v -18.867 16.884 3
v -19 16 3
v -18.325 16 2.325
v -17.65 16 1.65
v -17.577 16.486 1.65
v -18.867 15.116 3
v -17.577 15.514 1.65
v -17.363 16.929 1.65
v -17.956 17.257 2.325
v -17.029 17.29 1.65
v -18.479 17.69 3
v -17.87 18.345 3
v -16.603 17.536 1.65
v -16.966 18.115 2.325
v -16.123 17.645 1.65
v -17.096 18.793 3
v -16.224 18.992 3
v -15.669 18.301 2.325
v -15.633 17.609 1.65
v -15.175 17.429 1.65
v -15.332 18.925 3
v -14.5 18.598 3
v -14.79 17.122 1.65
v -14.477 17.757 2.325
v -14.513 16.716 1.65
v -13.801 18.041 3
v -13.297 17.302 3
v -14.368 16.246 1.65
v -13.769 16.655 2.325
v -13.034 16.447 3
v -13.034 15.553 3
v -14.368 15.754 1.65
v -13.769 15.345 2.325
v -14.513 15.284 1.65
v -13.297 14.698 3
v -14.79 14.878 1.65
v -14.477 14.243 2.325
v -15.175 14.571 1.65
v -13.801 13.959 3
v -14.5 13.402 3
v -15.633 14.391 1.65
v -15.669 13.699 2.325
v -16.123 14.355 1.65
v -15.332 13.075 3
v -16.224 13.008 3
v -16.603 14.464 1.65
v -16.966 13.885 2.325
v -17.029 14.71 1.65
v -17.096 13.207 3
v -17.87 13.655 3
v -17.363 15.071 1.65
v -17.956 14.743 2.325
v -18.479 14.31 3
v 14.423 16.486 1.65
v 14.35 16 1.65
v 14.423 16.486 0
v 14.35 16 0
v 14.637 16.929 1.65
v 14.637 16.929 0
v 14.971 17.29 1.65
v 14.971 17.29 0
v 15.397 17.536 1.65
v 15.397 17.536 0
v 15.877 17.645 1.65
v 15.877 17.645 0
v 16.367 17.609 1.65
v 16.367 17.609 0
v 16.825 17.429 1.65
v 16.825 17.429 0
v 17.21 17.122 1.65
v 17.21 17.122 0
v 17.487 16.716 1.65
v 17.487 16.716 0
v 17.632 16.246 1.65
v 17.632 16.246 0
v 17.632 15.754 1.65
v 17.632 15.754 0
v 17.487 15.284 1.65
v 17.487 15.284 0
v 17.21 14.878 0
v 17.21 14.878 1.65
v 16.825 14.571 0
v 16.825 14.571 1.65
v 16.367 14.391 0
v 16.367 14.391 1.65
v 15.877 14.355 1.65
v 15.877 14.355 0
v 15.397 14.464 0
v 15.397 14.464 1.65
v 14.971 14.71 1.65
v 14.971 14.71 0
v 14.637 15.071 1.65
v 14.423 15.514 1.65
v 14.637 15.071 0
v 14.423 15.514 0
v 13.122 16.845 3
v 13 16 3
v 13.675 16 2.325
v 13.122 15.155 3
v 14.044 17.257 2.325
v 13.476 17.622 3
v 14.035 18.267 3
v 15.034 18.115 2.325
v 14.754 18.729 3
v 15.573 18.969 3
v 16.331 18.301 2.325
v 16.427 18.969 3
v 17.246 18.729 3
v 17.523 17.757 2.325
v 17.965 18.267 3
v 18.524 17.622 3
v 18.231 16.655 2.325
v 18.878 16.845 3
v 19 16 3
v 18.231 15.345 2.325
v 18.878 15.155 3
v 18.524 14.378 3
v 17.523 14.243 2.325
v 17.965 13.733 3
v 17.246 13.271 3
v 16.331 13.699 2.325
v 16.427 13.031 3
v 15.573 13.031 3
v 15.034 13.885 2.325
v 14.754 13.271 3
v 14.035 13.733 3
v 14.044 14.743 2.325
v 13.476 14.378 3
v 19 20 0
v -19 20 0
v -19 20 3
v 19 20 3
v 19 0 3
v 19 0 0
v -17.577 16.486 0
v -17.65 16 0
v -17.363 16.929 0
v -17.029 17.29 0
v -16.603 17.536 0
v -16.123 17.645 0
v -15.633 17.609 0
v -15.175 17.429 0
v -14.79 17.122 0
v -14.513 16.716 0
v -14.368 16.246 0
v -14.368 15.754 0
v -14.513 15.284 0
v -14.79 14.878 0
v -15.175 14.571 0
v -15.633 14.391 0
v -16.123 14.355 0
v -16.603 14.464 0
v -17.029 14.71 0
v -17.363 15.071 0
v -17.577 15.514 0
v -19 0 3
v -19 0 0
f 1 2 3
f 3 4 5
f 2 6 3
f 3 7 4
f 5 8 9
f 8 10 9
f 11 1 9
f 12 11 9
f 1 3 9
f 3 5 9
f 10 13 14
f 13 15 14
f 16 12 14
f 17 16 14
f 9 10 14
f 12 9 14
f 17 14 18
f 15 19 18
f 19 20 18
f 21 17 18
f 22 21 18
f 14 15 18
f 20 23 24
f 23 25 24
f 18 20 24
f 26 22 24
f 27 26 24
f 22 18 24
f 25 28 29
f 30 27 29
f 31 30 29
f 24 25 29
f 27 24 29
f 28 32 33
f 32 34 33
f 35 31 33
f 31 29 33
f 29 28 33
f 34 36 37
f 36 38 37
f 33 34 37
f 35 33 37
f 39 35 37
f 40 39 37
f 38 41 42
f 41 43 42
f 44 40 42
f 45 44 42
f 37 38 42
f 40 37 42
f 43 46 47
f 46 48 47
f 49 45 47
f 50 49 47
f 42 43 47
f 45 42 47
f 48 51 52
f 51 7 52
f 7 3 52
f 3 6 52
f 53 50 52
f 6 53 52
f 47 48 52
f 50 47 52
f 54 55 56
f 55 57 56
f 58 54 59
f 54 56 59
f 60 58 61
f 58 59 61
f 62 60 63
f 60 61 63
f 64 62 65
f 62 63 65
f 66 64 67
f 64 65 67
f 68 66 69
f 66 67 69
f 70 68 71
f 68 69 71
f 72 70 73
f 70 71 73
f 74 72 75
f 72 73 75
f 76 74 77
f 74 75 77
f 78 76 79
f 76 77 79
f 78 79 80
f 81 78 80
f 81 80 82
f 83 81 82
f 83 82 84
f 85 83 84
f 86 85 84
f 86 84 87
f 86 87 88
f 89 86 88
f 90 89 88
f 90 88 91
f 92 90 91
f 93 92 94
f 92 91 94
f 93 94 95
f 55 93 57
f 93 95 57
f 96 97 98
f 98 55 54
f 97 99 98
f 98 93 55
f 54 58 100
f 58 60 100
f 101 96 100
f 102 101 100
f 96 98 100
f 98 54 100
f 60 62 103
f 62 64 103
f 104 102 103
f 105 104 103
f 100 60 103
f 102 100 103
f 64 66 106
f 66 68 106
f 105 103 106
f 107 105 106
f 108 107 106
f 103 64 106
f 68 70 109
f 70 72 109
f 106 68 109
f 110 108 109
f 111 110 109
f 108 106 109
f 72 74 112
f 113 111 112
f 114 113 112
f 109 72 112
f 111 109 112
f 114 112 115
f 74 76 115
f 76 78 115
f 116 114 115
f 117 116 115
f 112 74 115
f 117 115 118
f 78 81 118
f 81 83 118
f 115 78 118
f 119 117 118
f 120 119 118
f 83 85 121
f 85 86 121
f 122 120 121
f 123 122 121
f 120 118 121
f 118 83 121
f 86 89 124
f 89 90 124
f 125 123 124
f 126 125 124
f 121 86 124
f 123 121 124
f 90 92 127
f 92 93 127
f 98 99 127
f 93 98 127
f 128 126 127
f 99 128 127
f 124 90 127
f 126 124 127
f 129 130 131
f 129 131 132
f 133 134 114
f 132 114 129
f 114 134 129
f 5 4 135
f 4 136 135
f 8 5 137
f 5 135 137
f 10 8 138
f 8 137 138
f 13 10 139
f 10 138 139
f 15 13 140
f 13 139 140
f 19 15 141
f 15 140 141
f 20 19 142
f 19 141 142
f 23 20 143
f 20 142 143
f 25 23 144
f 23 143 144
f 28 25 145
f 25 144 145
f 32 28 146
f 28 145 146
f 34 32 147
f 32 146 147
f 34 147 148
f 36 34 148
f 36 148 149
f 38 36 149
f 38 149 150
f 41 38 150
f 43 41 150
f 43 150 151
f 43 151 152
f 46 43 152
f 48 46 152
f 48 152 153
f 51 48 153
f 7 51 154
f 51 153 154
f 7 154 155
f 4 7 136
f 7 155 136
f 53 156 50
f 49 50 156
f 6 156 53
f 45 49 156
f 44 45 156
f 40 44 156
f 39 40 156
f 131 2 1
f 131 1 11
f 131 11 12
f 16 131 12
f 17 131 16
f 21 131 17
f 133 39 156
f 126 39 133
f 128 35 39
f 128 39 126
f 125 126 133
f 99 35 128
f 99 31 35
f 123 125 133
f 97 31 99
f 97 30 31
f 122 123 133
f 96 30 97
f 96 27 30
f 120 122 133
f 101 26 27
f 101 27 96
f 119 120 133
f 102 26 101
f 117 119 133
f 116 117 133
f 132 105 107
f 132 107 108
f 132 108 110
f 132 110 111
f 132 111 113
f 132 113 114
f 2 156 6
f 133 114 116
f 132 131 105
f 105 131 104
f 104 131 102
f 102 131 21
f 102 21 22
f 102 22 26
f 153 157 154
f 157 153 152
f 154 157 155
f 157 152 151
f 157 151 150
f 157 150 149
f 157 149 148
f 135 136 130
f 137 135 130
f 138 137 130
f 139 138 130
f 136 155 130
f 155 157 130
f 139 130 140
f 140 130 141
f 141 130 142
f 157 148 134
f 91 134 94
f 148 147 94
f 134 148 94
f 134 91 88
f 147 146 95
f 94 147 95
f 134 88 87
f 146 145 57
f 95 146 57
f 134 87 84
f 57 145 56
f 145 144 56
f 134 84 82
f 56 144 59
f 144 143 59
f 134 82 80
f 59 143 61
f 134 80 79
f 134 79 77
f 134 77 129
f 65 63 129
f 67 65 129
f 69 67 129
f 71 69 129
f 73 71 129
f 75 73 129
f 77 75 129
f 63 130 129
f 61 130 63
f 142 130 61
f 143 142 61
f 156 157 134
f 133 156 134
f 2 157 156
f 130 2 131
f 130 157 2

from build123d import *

# Parameters (mm, degrees)
SKETCH1_W                                       = 38
SKETCH1_H                                       = 20
BOSS_EXTRUDE1_DEPTH                             = 3
CSK_FOR_M3_FLAT_HEAD_MACHINE_SCREW1_D           = 3.3
CSK_FOR_M3_FLAT_HEAD_MACHINE_SCREW1_CSINK_D     = 6
CSK_FOR_M3_FLAT_HEAD_MACHINE_SCREW1_CSINK_ANGLE = 90


with BuildPart() as part:
    # Sketch1 → Boss-Extrude1 (new body)
    with BuildSketch(Plane.XY):
        with Locations((0, 10)):
            Rectangle(SKETCH1_W, SKETCH1_H)
    extrude(amount=BOSS_EXTRUDE1_DEPTH)

    # CSK for M3 Flat Head Machine Screw1 (through all)
    with Locations(Plane.XY.offset(3)):
        with Locations((-16, 16), (16, 16)):
            CounterSinkHole(CSK_FOR_M3_FLAT_HEAD_MACHINE_SCREW1_D / 2, CSK_FOR_M3_FLAT_HEAD_MACHINE_SCREW1_CSINK_D / 2, counter_sink_angle=CSK_FOR_M3_FLAT_HEAD_MACHINE_SCREW1_CSINK_ANGLE)


solid = part.part
